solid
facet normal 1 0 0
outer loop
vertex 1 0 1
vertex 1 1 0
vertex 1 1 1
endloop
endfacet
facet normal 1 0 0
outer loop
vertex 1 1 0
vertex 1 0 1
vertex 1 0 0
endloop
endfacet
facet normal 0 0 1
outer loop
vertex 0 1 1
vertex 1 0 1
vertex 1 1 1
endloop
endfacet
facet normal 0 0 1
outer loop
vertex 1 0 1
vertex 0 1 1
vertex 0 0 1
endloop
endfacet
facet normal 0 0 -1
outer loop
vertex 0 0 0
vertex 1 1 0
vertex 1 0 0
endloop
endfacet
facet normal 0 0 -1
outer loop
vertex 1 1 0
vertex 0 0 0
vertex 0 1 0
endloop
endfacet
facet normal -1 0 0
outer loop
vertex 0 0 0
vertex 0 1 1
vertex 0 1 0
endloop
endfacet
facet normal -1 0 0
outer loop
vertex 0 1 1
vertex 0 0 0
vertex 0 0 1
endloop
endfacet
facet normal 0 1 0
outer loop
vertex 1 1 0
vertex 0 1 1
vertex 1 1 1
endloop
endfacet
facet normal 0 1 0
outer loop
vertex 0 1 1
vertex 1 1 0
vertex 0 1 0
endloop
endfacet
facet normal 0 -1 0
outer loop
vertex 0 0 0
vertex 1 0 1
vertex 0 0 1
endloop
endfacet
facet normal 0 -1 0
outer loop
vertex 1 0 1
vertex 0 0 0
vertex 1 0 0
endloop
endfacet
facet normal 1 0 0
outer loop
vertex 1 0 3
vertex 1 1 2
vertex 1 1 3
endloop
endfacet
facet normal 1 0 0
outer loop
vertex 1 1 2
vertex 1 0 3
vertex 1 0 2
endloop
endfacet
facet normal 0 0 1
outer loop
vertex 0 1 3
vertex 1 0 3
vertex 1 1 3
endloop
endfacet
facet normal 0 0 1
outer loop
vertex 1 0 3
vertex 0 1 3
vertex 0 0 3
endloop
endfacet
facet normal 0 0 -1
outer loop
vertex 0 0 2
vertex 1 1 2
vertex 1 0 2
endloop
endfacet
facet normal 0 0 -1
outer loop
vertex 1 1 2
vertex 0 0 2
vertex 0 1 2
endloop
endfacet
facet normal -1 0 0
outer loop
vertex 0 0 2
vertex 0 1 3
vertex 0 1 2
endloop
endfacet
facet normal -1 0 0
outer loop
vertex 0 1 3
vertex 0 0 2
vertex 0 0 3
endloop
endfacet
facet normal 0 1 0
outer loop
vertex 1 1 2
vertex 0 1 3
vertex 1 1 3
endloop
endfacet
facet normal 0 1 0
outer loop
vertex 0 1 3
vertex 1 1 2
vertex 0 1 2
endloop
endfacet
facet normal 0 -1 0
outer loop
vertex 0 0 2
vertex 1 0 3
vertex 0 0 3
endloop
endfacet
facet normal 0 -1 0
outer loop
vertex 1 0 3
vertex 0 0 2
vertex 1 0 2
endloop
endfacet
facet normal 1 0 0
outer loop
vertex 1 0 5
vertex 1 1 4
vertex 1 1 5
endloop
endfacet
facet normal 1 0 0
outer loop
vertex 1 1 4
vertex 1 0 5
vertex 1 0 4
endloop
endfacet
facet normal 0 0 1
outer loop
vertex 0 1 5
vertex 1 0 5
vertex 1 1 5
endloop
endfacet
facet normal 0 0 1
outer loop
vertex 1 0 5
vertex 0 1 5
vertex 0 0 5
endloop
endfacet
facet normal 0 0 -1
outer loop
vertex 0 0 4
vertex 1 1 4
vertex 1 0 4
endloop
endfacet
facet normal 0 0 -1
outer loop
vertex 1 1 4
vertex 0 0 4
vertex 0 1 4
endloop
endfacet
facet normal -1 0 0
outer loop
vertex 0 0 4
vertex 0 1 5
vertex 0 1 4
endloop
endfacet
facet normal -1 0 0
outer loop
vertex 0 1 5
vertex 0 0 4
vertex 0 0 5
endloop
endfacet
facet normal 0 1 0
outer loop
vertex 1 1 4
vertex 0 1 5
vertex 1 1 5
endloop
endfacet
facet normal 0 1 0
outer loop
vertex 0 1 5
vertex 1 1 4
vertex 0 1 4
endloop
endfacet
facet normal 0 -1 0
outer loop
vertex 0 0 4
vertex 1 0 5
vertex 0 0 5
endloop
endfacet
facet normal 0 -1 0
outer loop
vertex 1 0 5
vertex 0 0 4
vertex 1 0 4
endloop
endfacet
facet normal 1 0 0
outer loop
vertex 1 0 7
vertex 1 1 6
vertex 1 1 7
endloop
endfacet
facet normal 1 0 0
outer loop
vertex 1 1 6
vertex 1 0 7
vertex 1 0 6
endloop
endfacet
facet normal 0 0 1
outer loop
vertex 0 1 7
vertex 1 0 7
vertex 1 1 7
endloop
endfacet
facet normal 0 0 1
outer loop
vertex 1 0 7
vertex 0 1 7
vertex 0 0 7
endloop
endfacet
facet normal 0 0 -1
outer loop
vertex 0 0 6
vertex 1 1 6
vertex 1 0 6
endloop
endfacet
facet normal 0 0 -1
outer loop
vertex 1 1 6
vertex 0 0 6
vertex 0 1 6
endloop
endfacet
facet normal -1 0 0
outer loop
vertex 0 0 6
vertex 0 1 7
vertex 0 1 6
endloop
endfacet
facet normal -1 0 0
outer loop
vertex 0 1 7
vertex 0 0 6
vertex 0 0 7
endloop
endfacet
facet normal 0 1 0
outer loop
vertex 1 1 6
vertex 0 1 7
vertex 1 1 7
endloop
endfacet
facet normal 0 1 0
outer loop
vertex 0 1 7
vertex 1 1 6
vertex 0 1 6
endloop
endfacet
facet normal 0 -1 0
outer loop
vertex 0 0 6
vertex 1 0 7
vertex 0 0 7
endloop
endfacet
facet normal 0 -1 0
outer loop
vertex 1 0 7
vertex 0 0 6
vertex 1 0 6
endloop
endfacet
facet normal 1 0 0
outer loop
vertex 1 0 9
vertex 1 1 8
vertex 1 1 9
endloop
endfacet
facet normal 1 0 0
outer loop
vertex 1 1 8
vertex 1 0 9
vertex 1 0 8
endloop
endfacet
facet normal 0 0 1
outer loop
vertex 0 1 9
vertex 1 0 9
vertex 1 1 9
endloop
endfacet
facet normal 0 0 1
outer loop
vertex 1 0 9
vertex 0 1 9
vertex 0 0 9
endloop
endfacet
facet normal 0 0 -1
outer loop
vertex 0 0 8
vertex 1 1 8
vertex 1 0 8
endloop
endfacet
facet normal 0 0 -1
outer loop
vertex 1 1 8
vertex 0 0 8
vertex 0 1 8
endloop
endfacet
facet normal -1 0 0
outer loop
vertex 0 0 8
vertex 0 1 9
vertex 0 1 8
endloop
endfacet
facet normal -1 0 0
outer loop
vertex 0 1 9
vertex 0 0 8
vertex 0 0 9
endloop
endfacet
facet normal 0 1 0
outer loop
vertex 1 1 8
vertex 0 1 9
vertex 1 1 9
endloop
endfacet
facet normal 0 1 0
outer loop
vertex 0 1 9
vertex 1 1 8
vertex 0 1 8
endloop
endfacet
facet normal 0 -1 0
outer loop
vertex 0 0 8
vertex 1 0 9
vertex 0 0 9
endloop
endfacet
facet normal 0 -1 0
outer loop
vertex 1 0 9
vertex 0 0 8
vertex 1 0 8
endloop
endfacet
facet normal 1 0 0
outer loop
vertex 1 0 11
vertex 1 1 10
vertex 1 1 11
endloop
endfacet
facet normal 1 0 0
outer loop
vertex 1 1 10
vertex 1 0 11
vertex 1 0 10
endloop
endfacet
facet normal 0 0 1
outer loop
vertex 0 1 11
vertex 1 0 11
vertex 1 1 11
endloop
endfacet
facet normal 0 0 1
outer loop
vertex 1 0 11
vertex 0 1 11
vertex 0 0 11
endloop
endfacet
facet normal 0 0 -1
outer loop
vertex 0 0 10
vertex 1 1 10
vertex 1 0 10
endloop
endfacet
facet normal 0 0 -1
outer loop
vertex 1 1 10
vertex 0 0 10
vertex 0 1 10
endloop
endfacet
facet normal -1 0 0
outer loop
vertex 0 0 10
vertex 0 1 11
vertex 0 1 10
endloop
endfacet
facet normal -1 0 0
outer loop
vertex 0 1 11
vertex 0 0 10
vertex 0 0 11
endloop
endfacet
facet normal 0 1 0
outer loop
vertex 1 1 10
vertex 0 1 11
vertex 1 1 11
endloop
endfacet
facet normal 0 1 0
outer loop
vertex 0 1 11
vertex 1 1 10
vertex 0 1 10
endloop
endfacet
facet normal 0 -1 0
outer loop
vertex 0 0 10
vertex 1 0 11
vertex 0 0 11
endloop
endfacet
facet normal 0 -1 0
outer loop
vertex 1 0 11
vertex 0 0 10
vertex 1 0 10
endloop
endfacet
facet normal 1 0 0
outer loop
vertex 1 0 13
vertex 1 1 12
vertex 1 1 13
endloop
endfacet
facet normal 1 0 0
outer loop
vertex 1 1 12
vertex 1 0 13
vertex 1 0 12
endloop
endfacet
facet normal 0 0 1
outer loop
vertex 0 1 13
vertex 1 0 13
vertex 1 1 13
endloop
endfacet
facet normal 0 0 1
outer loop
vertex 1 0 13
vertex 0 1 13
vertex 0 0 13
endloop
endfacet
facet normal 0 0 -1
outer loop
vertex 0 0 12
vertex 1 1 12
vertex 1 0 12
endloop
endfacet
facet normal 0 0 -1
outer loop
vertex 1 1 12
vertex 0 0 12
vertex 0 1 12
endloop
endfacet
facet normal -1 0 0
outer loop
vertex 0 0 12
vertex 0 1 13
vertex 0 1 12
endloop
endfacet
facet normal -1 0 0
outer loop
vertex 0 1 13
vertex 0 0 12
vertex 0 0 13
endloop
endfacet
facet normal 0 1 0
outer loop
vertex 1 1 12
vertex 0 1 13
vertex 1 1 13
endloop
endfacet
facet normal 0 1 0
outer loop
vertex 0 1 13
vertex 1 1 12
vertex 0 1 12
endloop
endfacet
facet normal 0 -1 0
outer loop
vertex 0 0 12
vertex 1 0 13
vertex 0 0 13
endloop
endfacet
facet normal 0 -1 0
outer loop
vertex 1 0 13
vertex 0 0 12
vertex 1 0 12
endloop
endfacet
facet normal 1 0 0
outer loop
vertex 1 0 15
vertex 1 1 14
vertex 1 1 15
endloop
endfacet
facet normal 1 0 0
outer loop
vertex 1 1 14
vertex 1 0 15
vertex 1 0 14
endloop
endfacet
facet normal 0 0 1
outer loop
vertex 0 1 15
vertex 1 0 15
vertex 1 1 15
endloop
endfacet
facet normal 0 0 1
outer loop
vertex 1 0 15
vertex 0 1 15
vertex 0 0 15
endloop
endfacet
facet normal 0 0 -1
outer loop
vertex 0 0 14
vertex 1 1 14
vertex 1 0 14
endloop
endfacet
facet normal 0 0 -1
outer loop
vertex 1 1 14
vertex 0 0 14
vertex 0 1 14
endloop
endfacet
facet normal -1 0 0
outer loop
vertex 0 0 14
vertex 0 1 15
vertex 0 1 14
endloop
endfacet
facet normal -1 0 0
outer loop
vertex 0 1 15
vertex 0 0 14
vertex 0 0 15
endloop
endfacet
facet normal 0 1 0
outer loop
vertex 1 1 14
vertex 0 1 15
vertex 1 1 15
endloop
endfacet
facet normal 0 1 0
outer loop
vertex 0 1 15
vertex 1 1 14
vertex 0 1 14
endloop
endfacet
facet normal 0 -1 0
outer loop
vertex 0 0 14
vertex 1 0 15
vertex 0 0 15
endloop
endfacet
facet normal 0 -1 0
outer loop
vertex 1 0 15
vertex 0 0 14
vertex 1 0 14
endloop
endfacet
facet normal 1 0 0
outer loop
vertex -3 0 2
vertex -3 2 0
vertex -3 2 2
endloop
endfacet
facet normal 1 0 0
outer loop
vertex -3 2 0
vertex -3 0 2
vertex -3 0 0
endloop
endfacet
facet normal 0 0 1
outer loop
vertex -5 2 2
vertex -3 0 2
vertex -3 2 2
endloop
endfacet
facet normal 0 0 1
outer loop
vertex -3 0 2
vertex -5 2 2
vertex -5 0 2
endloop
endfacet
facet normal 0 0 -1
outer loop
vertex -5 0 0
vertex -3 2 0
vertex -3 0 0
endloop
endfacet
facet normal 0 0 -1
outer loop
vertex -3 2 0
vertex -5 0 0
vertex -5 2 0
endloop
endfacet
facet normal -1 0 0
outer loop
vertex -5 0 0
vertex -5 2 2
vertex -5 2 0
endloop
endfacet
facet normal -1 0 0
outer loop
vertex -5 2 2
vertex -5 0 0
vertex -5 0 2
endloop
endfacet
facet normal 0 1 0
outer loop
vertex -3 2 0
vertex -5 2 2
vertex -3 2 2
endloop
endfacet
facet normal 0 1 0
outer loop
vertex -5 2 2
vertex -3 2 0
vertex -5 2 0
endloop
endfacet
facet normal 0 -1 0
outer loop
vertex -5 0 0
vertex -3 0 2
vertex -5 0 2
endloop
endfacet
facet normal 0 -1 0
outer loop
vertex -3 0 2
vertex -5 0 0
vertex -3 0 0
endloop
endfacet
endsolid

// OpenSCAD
union() {
	for(scad_for_index = [0:1:7]) {
		translate(v = [0, 0, (scad_for_index * 2)]) {
			cube(size = 1);
		}

	}
	if(($t < 0.5)) {
		translate(v = [-5, 0, 0]) {
			cube(size = 2);
		}

	} else {
		color(alpha = 1.0, c = "red") {
			translate(v = [-5, 0, 0]) {
				cube(size = 2);
			}
		}

	}
}
